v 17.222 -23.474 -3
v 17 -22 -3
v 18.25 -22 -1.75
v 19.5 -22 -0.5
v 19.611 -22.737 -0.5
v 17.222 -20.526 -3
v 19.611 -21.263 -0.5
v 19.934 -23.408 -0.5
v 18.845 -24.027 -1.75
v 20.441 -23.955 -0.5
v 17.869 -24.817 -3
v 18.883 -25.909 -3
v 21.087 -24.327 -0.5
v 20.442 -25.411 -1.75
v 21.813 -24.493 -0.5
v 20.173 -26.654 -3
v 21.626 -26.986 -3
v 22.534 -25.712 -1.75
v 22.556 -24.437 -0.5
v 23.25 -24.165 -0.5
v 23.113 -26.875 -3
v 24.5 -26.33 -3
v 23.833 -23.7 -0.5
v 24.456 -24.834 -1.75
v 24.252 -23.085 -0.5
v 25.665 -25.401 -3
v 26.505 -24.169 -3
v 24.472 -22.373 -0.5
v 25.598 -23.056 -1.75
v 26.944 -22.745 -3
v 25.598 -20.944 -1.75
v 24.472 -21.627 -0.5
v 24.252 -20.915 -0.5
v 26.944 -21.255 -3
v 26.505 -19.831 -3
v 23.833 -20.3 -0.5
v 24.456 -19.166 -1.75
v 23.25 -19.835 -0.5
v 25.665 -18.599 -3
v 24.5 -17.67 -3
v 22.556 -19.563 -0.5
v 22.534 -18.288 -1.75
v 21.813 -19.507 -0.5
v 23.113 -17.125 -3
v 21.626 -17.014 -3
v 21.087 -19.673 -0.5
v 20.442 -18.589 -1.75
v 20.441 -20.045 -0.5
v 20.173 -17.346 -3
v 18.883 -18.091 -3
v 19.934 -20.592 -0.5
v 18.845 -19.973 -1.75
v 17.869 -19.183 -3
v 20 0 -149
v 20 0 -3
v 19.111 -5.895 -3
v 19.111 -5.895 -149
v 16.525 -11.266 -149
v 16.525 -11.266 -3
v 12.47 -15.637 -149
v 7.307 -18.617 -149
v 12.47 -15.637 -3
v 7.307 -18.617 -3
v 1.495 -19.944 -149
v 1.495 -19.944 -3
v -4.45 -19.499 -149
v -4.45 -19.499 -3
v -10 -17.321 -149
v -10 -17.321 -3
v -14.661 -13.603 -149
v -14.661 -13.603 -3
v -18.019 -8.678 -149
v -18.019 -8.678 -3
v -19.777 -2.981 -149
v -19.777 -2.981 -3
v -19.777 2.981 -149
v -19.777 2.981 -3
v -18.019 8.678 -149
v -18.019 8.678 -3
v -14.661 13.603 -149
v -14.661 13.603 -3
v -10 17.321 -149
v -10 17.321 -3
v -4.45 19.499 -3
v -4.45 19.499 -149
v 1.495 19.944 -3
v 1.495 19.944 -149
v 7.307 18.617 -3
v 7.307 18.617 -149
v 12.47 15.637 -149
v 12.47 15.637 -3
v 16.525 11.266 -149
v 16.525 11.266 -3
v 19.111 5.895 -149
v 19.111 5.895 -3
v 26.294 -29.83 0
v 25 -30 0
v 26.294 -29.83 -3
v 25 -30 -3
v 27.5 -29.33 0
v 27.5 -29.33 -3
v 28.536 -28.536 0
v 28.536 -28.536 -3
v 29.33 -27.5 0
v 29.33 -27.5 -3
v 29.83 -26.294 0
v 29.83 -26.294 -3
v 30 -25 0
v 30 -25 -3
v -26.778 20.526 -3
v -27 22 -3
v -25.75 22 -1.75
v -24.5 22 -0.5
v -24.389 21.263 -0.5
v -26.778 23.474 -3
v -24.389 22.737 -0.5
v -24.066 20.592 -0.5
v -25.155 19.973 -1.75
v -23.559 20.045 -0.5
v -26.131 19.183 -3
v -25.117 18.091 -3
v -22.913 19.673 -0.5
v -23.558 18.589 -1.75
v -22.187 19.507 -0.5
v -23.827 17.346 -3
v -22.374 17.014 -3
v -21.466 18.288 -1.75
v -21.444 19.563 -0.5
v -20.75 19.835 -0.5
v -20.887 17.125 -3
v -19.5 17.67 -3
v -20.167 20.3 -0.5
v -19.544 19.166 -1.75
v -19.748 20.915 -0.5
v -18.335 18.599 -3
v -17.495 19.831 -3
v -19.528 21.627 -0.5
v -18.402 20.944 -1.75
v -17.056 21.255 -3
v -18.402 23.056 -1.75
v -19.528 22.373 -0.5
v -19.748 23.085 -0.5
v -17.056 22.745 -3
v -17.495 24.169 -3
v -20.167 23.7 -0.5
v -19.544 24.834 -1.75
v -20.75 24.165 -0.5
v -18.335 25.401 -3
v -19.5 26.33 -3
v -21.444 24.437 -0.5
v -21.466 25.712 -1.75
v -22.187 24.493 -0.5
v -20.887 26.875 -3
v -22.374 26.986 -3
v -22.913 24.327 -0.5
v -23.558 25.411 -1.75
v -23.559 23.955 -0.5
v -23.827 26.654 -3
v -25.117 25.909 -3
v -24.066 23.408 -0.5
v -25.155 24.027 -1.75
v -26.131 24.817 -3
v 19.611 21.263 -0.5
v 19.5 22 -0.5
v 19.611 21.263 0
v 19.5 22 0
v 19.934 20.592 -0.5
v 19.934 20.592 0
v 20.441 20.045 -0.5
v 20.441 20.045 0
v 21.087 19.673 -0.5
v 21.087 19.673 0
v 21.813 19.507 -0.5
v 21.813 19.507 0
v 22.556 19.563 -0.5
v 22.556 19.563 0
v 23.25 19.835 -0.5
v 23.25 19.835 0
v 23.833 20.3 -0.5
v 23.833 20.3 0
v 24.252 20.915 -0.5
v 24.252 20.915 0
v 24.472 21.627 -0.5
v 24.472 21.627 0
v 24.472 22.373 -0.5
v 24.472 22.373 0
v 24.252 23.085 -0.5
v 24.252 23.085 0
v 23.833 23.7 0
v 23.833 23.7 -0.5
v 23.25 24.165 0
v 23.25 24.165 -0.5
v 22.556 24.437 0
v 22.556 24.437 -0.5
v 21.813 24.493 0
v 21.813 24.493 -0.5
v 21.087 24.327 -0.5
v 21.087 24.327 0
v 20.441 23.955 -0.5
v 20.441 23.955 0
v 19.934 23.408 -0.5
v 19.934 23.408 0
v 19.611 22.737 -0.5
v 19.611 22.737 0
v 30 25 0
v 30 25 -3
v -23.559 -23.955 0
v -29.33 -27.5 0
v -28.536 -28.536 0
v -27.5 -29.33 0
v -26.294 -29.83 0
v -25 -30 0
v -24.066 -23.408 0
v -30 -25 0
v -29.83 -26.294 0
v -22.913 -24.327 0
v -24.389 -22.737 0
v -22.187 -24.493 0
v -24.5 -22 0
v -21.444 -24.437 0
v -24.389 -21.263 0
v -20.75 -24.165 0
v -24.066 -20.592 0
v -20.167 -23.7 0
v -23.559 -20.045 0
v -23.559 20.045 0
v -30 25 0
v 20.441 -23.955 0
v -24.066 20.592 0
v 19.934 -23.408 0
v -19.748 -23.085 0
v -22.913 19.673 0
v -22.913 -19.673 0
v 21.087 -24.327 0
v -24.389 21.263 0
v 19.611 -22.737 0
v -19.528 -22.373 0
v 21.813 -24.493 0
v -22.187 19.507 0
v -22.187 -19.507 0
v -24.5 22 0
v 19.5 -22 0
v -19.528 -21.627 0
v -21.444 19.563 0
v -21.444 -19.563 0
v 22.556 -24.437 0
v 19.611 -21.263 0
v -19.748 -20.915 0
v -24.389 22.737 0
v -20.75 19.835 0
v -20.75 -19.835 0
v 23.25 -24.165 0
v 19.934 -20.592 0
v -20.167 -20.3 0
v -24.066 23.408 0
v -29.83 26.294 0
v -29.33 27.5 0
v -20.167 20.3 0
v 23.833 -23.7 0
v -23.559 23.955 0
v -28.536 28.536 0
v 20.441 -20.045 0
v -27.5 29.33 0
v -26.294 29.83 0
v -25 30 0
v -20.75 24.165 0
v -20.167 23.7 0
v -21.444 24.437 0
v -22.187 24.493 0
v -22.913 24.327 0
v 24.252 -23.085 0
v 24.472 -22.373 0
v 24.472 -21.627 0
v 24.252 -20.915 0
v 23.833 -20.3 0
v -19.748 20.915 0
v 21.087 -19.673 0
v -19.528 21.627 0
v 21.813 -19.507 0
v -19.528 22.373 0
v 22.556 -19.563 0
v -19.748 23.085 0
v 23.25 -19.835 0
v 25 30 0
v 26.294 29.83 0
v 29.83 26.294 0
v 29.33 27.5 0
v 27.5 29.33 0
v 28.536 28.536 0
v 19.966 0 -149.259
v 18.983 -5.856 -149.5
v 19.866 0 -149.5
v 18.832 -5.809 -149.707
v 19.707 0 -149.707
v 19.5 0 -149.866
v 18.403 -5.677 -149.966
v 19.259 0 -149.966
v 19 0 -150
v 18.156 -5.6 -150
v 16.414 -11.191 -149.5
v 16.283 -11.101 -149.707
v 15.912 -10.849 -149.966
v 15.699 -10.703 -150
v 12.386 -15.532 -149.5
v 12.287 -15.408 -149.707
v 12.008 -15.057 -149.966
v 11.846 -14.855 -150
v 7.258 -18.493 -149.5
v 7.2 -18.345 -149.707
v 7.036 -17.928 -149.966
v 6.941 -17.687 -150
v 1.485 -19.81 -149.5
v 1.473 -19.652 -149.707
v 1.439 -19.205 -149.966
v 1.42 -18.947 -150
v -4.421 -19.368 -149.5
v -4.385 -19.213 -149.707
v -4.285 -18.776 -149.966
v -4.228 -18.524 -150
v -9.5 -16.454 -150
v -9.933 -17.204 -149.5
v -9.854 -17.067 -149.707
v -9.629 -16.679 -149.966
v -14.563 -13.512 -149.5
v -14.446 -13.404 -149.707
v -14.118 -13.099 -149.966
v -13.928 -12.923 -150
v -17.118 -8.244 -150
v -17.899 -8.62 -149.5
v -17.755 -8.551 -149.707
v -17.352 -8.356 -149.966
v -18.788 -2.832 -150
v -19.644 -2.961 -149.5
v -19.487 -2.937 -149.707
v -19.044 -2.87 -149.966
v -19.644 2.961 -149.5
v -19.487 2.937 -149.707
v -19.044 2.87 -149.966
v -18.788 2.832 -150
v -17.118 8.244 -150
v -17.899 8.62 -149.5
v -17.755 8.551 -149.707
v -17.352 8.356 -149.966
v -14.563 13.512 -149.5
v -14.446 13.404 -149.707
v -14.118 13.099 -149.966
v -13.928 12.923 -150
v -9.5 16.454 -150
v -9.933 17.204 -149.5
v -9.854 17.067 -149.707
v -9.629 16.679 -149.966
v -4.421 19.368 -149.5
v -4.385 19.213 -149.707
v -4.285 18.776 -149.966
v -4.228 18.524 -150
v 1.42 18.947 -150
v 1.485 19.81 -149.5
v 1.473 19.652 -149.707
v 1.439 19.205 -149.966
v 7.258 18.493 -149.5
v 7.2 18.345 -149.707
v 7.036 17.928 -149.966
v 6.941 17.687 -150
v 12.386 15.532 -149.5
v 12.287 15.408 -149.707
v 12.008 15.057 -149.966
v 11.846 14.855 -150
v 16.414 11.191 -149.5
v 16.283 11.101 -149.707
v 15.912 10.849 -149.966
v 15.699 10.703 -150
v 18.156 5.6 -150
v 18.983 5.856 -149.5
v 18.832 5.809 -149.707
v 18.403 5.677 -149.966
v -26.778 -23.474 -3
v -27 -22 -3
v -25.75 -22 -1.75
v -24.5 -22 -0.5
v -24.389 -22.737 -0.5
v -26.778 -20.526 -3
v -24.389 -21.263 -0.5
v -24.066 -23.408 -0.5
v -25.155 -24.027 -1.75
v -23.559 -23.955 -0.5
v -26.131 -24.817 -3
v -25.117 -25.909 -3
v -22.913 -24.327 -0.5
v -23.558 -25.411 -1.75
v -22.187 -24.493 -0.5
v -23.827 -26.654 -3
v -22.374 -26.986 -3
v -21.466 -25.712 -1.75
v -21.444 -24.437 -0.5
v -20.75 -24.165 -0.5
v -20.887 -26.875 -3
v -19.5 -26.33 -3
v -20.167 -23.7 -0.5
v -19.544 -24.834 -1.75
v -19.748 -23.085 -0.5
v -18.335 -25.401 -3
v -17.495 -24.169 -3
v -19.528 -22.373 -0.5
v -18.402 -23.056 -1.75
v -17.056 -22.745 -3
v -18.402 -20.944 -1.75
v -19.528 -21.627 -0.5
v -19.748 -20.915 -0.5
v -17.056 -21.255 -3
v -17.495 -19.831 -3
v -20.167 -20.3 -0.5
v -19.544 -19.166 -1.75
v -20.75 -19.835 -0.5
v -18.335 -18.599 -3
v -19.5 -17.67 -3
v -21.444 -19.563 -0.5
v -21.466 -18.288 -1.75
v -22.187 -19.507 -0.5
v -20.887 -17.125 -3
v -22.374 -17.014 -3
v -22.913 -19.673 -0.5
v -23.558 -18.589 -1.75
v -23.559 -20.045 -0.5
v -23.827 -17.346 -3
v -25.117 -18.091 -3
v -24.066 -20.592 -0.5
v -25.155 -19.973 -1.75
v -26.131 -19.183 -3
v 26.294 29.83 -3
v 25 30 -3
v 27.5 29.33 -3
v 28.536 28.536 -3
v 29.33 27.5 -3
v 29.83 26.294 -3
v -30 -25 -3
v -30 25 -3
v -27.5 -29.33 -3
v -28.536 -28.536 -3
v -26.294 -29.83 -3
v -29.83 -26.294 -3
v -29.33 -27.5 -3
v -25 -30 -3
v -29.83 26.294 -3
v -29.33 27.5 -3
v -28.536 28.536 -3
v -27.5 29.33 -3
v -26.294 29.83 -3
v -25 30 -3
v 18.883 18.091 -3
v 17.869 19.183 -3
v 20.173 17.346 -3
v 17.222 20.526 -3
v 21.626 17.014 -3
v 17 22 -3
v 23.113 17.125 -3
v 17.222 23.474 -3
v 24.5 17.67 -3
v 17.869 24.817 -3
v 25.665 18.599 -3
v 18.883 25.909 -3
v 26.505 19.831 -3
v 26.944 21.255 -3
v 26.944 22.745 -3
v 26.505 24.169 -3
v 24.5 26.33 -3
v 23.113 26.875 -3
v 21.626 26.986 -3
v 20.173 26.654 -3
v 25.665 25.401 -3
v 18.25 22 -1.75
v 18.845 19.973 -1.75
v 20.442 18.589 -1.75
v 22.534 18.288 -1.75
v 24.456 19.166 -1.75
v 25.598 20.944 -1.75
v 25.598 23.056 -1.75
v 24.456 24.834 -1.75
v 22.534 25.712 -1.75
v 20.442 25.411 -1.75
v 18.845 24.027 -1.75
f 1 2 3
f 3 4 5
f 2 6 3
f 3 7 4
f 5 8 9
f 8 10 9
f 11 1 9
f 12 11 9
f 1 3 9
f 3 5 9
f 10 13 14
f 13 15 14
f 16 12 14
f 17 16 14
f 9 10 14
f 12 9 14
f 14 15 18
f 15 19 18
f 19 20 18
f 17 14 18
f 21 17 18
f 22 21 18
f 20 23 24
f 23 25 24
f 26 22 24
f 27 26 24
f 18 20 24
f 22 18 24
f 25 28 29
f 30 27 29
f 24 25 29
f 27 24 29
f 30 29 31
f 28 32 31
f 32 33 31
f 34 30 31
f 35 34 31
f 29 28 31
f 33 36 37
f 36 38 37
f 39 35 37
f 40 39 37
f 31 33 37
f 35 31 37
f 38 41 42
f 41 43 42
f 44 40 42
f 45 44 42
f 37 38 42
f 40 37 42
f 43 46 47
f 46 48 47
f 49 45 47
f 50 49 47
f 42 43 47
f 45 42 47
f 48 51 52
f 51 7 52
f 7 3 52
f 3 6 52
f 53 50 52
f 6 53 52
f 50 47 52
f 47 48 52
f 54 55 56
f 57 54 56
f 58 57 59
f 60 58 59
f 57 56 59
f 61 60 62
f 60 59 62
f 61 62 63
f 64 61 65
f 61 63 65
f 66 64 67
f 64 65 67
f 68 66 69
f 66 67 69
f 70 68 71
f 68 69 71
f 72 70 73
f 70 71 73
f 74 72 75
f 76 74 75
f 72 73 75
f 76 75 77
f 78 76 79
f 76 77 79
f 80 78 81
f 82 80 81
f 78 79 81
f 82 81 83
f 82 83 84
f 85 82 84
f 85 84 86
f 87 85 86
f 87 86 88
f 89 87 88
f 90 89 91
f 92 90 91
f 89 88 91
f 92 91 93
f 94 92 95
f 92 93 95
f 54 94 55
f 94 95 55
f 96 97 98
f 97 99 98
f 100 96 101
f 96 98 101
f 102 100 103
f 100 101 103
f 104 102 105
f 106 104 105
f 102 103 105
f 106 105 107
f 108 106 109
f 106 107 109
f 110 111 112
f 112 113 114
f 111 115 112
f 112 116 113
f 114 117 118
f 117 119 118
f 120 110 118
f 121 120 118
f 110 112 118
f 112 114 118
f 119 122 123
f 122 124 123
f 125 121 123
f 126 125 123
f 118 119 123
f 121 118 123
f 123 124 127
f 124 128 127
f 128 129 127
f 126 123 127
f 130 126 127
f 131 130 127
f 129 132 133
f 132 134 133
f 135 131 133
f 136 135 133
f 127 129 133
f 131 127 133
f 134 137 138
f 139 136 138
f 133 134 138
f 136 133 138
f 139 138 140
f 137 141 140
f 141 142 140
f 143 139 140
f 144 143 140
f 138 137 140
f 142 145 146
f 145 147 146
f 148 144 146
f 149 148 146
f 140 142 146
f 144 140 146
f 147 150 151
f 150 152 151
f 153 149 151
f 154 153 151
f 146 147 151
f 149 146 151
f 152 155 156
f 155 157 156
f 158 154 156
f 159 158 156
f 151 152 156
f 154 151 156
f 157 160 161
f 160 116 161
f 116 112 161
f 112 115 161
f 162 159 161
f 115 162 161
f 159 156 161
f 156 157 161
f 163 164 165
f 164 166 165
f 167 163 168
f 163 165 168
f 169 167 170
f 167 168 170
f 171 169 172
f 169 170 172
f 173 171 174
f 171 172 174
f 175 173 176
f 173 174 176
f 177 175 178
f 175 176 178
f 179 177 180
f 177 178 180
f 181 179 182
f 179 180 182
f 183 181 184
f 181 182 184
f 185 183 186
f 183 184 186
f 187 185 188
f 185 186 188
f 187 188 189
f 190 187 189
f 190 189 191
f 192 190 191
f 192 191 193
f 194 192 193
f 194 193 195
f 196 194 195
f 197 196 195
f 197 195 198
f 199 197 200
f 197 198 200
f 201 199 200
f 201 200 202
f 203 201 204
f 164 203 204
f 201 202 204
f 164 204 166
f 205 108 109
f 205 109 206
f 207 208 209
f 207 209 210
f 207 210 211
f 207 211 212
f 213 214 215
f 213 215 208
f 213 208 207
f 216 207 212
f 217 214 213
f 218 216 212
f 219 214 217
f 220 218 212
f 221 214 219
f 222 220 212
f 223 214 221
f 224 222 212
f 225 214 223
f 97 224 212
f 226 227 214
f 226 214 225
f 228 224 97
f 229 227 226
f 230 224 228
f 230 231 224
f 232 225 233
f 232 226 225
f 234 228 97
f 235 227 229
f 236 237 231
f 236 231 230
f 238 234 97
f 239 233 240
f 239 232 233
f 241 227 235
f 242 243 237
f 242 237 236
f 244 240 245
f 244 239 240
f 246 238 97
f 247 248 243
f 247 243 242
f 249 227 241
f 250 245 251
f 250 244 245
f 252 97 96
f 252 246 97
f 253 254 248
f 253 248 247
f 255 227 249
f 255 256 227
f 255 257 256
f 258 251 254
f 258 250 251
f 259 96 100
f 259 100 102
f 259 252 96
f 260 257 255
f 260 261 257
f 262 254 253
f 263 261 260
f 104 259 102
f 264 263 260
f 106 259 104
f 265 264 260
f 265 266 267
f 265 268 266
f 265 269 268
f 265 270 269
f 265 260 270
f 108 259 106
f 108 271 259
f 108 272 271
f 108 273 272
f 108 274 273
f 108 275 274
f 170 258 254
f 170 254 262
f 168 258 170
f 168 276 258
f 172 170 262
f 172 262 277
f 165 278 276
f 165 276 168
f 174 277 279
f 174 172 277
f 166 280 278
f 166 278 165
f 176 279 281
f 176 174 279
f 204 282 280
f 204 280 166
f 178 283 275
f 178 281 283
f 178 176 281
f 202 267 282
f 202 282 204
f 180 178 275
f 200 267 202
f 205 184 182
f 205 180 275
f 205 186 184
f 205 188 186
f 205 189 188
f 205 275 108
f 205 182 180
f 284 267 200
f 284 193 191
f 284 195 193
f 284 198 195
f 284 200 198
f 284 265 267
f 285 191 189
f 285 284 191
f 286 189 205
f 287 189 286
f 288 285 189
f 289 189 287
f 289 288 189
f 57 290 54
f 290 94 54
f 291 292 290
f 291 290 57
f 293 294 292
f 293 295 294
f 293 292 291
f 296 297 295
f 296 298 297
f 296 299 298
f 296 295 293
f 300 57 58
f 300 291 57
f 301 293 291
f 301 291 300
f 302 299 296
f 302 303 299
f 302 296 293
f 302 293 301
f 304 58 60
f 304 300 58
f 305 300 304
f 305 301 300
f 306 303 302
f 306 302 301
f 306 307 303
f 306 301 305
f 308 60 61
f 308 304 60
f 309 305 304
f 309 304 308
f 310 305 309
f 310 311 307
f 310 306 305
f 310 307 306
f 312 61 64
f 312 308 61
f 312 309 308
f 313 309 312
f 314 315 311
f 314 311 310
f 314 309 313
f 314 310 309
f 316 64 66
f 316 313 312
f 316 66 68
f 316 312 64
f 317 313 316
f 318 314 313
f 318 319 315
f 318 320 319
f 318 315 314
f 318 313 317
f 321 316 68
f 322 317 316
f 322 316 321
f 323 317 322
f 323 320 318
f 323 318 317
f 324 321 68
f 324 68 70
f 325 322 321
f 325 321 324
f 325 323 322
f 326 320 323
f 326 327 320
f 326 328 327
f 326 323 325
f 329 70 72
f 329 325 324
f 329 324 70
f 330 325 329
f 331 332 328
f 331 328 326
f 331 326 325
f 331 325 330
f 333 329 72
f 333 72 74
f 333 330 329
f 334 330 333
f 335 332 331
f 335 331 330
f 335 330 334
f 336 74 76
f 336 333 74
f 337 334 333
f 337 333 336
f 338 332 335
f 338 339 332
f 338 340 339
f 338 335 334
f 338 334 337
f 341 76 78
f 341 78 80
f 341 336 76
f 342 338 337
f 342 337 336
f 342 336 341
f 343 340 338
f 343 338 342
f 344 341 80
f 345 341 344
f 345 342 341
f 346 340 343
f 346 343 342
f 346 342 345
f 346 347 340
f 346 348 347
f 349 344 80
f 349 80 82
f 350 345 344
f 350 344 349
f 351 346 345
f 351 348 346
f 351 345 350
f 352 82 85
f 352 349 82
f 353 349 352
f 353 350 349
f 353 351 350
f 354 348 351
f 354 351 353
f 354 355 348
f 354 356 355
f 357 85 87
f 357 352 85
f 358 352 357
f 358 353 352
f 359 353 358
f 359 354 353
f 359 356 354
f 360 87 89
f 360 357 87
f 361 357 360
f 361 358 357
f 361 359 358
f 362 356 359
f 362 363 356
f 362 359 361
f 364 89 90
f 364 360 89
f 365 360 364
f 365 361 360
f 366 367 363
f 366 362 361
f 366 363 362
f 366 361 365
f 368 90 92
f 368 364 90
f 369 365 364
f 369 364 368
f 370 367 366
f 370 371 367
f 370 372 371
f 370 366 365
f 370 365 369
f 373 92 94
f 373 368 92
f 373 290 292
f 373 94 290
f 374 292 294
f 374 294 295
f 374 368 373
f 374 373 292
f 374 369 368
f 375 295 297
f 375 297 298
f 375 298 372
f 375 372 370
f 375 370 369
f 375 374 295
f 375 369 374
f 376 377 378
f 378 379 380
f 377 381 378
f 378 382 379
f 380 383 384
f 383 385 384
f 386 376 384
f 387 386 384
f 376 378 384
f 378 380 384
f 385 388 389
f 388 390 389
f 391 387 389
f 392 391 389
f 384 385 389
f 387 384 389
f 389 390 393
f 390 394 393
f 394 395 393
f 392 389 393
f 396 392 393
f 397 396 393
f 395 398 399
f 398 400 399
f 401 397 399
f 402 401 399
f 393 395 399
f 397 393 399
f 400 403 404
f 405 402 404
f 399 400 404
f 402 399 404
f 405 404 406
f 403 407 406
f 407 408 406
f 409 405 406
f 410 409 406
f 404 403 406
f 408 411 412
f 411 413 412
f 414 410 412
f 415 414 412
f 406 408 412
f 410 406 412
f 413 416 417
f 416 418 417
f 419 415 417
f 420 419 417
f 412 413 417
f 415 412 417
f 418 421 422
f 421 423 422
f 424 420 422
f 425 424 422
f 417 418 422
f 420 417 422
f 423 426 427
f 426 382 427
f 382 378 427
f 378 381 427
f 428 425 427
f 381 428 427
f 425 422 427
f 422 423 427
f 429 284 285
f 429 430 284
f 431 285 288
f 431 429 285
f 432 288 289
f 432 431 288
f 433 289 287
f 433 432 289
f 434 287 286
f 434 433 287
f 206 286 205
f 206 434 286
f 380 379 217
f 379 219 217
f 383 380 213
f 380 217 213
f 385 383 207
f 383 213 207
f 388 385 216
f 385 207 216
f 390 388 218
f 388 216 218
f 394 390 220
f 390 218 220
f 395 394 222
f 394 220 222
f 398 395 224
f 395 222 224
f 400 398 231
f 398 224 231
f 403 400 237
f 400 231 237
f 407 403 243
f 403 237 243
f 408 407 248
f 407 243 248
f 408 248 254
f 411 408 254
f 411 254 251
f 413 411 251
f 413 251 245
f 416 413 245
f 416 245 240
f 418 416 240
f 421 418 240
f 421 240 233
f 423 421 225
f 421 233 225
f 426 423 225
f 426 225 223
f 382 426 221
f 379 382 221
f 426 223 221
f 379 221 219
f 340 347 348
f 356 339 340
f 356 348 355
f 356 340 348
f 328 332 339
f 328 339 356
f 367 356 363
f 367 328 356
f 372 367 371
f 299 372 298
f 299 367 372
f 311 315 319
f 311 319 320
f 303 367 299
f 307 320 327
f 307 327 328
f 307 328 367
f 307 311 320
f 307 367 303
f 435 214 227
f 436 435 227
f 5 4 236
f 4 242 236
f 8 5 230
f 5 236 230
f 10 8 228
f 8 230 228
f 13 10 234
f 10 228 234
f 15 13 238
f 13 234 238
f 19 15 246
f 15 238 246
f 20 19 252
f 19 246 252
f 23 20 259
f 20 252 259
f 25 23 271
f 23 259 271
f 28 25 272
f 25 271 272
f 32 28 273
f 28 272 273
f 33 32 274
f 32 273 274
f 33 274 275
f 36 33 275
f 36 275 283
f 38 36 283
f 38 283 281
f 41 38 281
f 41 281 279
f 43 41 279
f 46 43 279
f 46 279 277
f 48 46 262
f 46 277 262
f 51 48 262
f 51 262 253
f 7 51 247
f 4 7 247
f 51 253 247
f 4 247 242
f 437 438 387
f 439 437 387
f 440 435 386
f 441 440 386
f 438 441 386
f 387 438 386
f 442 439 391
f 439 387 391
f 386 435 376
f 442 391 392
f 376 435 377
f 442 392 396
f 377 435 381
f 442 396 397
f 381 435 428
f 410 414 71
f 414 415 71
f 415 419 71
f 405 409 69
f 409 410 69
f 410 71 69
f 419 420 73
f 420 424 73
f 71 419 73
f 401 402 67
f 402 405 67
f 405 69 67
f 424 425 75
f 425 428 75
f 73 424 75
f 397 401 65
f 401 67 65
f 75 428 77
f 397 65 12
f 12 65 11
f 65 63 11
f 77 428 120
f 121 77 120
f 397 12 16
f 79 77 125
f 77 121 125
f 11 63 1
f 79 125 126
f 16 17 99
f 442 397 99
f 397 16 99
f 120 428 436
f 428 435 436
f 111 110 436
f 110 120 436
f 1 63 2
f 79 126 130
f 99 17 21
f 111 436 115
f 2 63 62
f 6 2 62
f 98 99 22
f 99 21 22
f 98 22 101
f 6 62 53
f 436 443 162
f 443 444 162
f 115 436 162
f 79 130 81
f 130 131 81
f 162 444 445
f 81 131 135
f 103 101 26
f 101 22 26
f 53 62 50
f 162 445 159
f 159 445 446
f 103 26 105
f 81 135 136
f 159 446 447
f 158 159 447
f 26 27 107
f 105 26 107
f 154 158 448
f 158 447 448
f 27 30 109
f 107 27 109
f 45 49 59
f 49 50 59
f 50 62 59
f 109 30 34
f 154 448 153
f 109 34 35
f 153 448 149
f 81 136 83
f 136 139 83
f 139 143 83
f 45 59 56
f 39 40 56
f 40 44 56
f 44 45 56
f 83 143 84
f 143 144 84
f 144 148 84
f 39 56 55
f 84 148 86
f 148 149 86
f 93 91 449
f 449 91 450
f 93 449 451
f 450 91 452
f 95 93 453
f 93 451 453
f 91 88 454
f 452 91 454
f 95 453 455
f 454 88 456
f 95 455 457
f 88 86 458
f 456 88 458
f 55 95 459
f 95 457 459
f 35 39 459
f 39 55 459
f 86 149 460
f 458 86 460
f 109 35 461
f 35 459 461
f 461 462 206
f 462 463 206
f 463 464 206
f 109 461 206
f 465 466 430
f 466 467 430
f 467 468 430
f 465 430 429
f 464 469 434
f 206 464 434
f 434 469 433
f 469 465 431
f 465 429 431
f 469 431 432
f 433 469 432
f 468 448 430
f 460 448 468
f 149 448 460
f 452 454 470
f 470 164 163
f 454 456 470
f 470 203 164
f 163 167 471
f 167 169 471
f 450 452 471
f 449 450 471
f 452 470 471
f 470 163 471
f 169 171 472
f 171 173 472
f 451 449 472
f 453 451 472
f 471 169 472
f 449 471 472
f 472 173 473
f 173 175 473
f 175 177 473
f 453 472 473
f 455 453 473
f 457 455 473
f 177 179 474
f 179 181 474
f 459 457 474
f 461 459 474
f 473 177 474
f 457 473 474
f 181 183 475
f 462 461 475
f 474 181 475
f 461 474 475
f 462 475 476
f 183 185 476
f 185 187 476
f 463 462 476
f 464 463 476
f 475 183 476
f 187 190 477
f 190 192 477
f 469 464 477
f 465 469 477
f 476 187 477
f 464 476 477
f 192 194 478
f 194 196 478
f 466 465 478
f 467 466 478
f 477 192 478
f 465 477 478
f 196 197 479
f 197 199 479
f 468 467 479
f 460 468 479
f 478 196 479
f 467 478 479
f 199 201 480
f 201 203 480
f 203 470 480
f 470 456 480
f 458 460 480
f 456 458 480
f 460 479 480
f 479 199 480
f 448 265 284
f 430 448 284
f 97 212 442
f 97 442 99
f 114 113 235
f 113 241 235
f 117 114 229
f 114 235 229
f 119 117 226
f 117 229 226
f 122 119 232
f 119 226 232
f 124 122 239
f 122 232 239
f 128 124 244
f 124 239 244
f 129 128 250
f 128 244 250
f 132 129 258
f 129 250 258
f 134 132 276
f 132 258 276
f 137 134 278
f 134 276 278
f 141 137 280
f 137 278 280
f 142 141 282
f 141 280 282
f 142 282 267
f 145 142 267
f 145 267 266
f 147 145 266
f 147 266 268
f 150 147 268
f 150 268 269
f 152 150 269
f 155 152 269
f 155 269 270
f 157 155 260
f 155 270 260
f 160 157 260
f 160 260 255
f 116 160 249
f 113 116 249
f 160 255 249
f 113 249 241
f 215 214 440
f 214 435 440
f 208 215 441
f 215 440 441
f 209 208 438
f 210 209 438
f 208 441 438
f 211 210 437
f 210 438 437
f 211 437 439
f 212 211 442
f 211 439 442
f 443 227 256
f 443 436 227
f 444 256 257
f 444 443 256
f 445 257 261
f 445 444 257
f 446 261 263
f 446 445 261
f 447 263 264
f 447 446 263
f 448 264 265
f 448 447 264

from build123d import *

# Parameters (mm, degrees)
F0_W           = 60
F0_H           = 60
F1_DEPTH       = 3
F2_R           = 20
F3_DEPTH       = 147
F4_R           = 5
F6_D           = 5
F6_CSINK_D     = 10
F6_CSINK_ANGLE = 90
F7_R           = 1


with BuildPart() as f1:
    # F0 (on Top) → F1 (new body)
    with BuildSketch(Plane.XY):
        Rectangle(F0_W, F0_H)
    extrude(amount=-F1_DEPTH)

    # F2 (on face) → F3 (join)
    with BuildSketch(Plane(origin=(0, 0, -3), x_dir=(1, 0, 0), z_dir=(0, 0, -1))):
        Circle(F2_R)
    extrude(amount=F3_DEPTH)

    # F4
    f4_edges = [f1.edges().sort_by_distance(p)[0] for p in [
        (-30, -30, -1.5),
        (30, -30, -1.5),
        (30, 30, -1.5),
        (-30, 30, -1.5),
    ]]
    fillet(f4_edges, radius=F4_R)

    # F6 (through all)
    with Locations(Plane(origin=(0, 0, -3), x_dir=(1, 0, 0), z_dir=(0, 0, -1))):
        with Locations((-22, 22), (22, 22), (22, -22), (-22, -22)):
            CounterSinkHole(F6_D / 2, F6_CSINK_D / 2, counter_sink_angle=F6_CSINK_ANGLE)

    # F7
    f7_edges = [f1.edges().sort_by_distance(p)[0] for p in [
        (-20, 0, -150),
    ]]
    fillet(f7_edges, radius=F7_R)


solid = f1.part
